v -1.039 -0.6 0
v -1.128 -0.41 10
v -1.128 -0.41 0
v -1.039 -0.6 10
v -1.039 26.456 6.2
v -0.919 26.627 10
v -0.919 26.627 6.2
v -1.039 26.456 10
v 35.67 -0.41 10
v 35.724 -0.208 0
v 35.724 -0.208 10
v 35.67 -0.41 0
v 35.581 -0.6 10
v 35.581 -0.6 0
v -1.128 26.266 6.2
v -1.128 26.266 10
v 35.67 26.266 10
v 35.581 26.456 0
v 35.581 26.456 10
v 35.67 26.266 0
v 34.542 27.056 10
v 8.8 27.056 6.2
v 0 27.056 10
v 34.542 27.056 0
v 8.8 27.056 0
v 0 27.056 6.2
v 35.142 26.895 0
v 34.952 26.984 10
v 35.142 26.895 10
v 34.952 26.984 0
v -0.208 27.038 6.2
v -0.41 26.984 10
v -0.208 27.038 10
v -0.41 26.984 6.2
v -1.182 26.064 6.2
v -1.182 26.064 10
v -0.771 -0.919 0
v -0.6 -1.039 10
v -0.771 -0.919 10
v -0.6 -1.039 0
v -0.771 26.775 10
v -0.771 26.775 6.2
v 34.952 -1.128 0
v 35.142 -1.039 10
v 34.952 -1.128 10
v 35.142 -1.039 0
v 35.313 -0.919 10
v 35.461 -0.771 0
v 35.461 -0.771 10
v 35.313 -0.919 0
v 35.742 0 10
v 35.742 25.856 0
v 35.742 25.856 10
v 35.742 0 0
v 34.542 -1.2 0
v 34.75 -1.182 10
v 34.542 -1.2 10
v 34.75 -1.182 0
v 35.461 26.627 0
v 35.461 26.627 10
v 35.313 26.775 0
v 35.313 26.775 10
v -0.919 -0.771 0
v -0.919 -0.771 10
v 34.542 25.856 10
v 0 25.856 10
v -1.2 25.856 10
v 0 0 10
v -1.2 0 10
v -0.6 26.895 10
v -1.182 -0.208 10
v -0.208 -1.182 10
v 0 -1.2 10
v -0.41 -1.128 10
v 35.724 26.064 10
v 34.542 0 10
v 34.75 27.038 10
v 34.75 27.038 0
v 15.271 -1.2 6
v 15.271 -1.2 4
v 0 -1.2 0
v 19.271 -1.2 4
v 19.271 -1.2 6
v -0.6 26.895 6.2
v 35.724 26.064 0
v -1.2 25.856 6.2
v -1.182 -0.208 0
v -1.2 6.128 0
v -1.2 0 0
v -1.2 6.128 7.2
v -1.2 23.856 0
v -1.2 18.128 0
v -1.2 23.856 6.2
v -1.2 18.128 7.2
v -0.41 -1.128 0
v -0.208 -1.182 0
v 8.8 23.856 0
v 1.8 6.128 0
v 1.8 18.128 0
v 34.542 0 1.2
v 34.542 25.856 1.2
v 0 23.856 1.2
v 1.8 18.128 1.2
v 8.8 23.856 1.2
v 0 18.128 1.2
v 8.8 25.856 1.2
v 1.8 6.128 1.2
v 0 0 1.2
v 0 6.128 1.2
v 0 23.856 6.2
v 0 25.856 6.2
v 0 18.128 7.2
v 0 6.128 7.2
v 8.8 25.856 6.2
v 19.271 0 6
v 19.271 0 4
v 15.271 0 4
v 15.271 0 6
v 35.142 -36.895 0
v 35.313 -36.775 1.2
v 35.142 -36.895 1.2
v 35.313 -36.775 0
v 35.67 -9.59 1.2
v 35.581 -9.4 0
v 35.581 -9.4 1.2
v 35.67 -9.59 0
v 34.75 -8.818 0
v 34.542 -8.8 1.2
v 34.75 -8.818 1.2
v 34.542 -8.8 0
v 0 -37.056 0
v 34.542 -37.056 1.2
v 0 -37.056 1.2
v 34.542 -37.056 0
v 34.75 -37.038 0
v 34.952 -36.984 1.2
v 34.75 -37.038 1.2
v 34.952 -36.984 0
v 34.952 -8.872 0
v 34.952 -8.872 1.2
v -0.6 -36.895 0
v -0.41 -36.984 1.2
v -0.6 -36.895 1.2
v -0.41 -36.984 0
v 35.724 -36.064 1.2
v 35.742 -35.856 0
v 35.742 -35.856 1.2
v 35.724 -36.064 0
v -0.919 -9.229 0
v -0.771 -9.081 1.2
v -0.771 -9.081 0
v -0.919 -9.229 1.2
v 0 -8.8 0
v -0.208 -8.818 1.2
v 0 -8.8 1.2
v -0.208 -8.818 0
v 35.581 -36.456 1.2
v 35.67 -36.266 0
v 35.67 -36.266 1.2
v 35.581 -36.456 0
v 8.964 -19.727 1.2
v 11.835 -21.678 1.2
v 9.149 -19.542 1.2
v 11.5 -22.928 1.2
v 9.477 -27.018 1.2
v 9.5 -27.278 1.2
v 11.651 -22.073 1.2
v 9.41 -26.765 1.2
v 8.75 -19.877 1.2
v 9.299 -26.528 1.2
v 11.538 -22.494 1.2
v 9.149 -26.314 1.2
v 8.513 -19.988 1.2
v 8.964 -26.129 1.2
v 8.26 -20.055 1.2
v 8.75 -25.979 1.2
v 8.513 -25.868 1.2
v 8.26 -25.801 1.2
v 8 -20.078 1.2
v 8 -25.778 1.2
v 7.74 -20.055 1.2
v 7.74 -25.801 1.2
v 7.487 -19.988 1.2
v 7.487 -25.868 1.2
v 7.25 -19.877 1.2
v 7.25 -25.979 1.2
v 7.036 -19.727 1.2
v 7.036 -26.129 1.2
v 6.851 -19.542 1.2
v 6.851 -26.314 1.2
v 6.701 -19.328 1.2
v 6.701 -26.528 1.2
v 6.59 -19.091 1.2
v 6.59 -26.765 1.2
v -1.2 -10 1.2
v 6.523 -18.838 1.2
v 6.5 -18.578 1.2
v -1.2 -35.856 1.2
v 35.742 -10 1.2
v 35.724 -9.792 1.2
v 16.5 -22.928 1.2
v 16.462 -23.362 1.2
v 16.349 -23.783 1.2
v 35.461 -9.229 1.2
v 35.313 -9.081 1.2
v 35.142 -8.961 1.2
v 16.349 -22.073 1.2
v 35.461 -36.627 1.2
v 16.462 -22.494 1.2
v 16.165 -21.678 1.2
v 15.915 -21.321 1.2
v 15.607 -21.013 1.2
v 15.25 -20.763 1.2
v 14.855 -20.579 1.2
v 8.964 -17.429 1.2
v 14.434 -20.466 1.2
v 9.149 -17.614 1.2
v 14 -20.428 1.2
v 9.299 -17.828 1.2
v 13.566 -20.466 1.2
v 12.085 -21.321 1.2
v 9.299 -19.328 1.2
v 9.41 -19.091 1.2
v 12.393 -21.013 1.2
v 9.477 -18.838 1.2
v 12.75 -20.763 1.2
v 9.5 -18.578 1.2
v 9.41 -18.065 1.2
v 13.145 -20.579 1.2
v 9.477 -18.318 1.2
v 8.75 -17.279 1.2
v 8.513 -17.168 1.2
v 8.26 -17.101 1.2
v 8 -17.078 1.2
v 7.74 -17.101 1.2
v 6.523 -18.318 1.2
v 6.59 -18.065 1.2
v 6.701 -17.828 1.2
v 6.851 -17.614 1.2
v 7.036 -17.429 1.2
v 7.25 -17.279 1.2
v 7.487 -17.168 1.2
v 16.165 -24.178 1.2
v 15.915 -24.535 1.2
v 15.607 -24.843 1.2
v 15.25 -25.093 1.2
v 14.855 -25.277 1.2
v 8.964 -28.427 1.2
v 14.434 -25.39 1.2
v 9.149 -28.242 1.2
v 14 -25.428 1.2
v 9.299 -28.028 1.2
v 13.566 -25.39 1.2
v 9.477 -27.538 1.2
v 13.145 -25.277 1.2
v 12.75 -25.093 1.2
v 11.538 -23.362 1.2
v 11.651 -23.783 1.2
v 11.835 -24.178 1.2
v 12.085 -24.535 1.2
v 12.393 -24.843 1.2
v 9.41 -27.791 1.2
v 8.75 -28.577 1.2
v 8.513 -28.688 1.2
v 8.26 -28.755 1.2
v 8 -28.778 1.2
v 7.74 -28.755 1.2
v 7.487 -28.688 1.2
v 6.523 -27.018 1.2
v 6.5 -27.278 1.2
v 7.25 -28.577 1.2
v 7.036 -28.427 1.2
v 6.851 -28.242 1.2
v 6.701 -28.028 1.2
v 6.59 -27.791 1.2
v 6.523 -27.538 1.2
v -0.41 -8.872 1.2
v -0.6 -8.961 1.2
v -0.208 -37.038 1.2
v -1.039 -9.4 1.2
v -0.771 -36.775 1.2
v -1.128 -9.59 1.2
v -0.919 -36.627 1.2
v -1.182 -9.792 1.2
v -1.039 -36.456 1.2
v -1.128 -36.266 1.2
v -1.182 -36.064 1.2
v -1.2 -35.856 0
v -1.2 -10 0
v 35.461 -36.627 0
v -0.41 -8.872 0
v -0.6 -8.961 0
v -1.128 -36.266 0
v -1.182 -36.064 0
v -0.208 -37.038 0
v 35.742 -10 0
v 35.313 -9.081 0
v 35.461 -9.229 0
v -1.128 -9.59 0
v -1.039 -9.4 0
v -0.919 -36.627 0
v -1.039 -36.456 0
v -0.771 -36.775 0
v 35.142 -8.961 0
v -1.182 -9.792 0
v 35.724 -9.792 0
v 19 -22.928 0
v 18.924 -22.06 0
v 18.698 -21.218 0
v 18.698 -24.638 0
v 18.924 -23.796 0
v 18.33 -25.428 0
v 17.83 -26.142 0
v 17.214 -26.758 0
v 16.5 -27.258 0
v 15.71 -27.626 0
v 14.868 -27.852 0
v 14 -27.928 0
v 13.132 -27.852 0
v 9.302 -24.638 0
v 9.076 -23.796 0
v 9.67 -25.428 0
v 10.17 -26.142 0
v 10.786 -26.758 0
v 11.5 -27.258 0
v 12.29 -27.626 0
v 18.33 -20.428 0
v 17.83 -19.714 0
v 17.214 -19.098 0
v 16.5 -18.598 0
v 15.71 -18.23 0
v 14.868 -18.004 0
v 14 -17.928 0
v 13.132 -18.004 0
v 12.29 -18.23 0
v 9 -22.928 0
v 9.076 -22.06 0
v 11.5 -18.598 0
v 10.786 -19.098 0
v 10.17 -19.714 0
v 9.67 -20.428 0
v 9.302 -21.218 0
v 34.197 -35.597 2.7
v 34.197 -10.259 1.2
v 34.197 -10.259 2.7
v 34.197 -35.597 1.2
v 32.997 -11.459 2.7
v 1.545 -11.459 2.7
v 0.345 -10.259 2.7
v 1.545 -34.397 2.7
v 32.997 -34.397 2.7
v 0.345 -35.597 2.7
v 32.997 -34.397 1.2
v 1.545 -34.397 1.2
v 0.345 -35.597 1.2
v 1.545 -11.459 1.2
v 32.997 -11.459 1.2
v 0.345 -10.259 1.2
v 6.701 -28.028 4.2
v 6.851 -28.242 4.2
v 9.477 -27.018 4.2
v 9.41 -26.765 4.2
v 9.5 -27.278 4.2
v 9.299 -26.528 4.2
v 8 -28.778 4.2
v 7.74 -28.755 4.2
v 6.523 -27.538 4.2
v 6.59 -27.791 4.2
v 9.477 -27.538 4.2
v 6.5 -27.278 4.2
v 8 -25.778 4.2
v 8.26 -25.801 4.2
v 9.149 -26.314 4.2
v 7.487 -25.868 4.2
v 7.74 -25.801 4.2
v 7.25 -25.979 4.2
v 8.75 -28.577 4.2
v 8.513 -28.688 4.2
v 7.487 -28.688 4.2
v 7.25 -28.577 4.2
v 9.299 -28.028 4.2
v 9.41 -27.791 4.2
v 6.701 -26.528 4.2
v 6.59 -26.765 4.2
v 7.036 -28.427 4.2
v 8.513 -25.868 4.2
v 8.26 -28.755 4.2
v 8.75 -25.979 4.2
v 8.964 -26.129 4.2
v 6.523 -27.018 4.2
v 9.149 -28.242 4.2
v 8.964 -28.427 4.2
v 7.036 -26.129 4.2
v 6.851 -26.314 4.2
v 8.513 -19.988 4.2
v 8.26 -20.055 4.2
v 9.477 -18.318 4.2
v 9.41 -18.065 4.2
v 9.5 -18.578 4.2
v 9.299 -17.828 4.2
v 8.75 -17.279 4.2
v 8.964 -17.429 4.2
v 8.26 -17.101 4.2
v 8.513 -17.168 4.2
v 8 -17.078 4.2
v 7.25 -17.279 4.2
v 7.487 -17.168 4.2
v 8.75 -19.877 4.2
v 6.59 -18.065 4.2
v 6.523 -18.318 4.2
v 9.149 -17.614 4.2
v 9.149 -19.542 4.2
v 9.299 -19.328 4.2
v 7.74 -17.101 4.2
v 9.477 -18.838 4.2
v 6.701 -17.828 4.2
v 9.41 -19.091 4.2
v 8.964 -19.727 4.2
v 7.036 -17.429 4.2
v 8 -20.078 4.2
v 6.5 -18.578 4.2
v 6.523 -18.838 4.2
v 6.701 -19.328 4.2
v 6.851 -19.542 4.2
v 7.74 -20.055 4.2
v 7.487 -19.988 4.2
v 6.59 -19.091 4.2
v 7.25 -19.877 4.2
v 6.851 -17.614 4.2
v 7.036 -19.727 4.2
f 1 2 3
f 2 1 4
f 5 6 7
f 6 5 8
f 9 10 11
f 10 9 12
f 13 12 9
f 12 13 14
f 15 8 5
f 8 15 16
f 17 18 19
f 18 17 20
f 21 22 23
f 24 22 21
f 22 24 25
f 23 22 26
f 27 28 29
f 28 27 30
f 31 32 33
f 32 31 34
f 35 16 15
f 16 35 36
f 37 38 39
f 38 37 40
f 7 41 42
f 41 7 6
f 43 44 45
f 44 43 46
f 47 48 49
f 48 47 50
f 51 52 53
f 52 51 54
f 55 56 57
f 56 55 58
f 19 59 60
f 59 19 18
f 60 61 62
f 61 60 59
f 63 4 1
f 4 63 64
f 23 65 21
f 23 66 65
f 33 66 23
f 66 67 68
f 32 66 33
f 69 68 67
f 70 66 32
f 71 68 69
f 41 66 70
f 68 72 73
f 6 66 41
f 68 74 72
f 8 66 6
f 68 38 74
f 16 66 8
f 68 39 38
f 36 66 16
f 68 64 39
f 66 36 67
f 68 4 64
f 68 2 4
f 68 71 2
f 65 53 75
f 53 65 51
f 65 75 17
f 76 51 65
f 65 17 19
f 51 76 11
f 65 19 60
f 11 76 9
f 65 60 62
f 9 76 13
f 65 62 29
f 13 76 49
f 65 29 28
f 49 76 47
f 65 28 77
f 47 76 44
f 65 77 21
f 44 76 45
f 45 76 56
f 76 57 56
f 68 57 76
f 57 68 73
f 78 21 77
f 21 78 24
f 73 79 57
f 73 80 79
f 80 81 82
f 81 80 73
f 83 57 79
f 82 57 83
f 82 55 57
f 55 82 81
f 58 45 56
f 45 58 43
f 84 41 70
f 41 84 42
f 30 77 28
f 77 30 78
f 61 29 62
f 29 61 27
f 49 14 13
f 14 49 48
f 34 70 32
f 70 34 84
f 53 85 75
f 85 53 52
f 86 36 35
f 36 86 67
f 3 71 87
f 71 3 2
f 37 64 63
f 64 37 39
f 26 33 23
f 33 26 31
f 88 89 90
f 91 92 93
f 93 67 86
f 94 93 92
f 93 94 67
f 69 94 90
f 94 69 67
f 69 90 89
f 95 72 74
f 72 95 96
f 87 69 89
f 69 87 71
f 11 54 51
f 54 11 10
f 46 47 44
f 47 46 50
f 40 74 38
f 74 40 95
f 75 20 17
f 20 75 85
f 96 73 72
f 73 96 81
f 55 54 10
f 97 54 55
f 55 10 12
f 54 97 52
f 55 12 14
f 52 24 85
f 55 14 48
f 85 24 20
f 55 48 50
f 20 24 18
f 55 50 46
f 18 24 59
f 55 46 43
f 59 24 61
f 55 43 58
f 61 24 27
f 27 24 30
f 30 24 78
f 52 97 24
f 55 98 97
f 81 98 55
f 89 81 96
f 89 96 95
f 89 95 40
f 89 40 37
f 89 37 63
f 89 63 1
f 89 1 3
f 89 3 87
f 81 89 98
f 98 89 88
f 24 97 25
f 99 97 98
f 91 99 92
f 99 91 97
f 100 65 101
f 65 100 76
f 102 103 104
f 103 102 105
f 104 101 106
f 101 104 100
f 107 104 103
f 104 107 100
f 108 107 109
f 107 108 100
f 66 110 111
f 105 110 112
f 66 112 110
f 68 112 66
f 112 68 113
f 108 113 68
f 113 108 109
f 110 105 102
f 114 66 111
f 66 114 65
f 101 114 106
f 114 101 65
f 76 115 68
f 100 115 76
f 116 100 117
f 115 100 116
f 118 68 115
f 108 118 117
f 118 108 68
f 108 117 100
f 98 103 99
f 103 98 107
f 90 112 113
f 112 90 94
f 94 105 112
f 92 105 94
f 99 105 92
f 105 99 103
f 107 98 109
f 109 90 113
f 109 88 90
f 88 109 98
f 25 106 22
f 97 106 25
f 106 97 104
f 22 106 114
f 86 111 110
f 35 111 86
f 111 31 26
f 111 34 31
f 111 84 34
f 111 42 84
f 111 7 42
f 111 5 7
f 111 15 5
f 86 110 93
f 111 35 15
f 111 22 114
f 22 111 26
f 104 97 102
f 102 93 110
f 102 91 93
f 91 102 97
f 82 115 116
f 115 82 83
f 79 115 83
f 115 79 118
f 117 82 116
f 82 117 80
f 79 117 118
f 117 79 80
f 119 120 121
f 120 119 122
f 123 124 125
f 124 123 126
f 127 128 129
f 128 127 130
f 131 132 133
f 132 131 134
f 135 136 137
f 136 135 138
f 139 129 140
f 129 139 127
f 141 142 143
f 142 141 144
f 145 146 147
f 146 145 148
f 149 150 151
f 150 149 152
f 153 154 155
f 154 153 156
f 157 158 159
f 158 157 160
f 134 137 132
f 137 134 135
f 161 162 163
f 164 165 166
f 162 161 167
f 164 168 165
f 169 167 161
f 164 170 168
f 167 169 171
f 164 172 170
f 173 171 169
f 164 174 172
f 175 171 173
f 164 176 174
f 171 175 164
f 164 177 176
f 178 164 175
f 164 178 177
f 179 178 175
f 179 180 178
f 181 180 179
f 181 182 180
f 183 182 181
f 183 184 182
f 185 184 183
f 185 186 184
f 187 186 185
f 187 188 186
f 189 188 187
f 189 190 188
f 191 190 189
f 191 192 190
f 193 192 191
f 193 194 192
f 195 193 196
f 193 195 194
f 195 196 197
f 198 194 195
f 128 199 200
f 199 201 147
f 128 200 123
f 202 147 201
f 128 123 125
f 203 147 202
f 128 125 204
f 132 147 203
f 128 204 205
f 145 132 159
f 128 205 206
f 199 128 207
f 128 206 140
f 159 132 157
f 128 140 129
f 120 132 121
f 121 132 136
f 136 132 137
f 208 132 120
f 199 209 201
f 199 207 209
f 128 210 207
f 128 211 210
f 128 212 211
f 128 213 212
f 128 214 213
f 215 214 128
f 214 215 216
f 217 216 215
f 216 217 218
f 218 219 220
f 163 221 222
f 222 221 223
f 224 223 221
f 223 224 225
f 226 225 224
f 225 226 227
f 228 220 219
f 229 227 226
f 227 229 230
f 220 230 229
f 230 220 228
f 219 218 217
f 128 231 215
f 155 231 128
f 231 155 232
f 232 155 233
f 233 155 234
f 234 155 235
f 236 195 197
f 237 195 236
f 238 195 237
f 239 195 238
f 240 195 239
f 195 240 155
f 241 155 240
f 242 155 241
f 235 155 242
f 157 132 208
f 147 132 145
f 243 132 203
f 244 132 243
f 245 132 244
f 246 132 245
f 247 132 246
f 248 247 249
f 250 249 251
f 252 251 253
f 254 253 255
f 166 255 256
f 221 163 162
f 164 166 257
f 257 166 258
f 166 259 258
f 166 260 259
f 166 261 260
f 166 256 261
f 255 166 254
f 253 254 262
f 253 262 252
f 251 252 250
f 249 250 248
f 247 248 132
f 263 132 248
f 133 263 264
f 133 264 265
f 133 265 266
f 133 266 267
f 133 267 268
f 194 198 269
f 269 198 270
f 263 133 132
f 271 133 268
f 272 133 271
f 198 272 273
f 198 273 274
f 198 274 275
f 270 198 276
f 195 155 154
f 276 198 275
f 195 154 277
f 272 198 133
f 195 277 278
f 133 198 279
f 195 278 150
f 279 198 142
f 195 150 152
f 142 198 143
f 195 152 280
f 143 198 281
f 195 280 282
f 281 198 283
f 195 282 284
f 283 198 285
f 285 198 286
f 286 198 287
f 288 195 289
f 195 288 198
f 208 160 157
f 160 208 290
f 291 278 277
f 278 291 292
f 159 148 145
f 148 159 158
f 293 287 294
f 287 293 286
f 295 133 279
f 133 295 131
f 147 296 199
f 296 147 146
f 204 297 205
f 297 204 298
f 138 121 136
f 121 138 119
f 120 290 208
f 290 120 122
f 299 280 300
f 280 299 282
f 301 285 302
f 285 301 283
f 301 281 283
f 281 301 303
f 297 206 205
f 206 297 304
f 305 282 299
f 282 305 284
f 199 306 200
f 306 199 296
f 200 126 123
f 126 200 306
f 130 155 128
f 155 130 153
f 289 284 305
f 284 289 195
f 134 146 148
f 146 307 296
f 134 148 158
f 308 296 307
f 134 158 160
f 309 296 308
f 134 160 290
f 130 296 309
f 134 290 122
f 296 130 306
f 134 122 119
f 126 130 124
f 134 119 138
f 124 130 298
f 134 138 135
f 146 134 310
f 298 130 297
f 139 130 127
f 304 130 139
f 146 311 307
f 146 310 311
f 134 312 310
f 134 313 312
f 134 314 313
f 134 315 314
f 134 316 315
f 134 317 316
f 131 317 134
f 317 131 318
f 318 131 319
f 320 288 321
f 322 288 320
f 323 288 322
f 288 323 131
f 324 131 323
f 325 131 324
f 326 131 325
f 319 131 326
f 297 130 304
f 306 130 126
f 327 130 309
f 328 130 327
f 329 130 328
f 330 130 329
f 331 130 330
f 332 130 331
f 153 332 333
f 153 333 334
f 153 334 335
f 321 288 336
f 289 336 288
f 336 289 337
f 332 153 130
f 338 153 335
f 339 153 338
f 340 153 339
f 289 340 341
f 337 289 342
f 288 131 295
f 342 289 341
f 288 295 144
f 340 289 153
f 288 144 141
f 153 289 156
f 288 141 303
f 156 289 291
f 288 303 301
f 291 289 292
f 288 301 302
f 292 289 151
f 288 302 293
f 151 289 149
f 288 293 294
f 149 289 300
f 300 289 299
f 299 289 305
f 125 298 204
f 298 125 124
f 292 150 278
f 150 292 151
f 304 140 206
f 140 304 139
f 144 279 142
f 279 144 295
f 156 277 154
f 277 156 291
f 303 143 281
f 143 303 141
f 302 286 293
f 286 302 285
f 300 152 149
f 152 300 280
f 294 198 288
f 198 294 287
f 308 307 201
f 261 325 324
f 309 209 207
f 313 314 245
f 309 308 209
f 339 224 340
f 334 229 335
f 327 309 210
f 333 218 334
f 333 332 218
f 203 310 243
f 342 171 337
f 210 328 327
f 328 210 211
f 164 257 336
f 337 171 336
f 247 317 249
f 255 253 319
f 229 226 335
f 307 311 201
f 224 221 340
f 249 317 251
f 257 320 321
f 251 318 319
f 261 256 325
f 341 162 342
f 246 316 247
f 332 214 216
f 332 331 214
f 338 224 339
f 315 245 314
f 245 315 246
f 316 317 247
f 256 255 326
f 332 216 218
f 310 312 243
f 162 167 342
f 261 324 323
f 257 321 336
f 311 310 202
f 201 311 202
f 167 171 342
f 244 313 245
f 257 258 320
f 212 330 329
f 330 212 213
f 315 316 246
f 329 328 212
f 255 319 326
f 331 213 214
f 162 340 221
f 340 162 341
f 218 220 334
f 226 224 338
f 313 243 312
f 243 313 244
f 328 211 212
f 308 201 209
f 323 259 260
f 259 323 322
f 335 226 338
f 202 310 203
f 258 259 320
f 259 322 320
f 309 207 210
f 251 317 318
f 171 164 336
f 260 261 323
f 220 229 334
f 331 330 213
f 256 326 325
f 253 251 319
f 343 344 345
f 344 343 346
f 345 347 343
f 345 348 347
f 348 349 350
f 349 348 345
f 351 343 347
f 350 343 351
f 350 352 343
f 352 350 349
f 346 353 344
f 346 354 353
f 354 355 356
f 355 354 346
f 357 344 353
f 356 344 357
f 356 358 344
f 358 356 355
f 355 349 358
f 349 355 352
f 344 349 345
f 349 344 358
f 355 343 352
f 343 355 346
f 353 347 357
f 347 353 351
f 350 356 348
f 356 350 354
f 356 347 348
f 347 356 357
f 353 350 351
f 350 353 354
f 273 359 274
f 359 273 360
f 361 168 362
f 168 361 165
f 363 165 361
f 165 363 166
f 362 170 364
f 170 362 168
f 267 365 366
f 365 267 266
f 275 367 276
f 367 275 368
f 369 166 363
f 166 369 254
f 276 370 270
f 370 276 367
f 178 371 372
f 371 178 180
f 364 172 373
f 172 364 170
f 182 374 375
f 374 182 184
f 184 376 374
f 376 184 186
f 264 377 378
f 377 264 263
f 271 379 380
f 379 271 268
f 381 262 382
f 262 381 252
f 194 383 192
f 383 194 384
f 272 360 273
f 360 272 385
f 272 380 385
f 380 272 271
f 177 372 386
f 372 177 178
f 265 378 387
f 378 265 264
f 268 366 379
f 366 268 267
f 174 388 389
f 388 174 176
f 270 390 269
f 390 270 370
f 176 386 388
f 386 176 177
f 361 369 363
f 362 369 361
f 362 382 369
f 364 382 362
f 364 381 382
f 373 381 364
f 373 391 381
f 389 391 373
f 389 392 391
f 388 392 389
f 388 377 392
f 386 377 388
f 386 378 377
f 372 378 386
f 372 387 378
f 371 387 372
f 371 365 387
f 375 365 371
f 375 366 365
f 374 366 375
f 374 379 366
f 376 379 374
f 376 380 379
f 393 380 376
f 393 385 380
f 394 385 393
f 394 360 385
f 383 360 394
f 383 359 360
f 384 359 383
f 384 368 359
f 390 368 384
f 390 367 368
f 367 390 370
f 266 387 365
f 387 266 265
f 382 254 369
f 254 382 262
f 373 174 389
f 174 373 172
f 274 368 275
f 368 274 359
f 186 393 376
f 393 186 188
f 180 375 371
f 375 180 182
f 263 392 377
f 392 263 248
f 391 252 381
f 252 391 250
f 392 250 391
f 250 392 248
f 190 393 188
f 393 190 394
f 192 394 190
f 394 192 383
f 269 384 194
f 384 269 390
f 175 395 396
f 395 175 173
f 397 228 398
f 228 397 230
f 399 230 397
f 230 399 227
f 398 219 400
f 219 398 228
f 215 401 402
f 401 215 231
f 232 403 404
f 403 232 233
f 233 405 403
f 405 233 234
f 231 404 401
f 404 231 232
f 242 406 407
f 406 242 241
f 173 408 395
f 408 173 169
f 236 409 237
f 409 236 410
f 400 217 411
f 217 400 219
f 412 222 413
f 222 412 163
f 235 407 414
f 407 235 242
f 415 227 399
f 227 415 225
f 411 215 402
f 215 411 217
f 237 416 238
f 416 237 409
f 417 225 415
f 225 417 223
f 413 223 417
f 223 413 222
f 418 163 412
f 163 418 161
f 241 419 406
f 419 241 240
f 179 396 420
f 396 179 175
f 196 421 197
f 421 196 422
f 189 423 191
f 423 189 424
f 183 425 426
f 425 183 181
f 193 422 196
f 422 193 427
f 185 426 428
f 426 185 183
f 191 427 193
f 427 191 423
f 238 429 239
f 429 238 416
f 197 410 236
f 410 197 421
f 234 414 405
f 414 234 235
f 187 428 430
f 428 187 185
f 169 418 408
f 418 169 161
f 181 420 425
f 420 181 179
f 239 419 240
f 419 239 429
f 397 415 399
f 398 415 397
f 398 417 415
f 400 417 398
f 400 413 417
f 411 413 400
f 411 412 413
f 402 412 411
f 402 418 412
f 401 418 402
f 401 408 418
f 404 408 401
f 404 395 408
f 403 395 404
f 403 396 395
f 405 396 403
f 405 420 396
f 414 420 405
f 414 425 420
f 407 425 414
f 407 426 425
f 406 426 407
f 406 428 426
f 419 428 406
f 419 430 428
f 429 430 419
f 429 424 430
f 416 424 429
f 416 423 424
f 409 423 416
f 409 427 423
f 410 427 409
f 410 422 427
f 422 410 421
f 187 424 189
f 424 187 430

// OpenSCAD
t = 1.2;
tolerance = 0.98;

hull_x = 34.2*1.01;
hull_y = 25.6*1.01;
hull_z = 10.0;

$fn=36;

cableHole = true;
sensorHole = true;

module usb()
{
    translate([-t, hull_y/2 + t-8, 0]) cube([3, 12 ,6+t]);
}

module reset()
{
    translate([-t, hull_y-2, 0]) cube([10, 2+t, 5+t]);
}

module cable()
{
    translate([(hull_x-4)/2, -t, (hull_z-2)/2]) cube([4, t, 2]);

}

module hull()
{    
    difference()
    {
        minkowski()
        {
            cube([hull_x, hull_y, hull_z-1]);
            cylinder(r=t, h=1);
        }
    
        translate([0, 0, t]) cube([hull_x, hull_y, hull_z-t]);
        
        usb();
        reset();
        
        if (cableHole)
        {
            cable();
        }
    }
}

module hole()
{
    translate([14, hull_y / 2, 0]) cylinder(h = t, r2 = 2.5, r1 = 5);
}

module holder()
{
    translate([8, hull_y / 2 - 4.35, 0]) cylinder(h = 3 + t, r = 1.5);
    translate([8, hull_y / 2 + 4.35, 0]) cylinder(h = 3 + t, r = 1.5);    
}

module border()
{
    height = 1.5;
    
    difference()
    {
        cube([hull_x*tolerance, hull_y*tolerance, height]);
        translate([t, t, 0]) cube([hull_x*tolerance-2*t, hull_y*tolerance-2*t, height]);
    }
}

module cover()
{
    difference()
    {
        minkowski()
        {
            cube([hull_x, hull_y, t-1]);
            cylinder(r=t, h=1);
        }
        
        if (sensorHole)
        {
            hole();
        }
    }
    
    translate([(1-tolerance)/2*hull_x,(1-tolerance)/2*hull_y, t]) border();
    
    if (sensorHole)
    {
        holder();
    }
}

translate([0, 0, 0]) hull();
translate([0, -hull_y-10, 0]) color("red", 1.0) cover();
//translate([0, hull_y, hull_z+1]) rotate([180, 0, 0]) color("red", 1.0) cover();
